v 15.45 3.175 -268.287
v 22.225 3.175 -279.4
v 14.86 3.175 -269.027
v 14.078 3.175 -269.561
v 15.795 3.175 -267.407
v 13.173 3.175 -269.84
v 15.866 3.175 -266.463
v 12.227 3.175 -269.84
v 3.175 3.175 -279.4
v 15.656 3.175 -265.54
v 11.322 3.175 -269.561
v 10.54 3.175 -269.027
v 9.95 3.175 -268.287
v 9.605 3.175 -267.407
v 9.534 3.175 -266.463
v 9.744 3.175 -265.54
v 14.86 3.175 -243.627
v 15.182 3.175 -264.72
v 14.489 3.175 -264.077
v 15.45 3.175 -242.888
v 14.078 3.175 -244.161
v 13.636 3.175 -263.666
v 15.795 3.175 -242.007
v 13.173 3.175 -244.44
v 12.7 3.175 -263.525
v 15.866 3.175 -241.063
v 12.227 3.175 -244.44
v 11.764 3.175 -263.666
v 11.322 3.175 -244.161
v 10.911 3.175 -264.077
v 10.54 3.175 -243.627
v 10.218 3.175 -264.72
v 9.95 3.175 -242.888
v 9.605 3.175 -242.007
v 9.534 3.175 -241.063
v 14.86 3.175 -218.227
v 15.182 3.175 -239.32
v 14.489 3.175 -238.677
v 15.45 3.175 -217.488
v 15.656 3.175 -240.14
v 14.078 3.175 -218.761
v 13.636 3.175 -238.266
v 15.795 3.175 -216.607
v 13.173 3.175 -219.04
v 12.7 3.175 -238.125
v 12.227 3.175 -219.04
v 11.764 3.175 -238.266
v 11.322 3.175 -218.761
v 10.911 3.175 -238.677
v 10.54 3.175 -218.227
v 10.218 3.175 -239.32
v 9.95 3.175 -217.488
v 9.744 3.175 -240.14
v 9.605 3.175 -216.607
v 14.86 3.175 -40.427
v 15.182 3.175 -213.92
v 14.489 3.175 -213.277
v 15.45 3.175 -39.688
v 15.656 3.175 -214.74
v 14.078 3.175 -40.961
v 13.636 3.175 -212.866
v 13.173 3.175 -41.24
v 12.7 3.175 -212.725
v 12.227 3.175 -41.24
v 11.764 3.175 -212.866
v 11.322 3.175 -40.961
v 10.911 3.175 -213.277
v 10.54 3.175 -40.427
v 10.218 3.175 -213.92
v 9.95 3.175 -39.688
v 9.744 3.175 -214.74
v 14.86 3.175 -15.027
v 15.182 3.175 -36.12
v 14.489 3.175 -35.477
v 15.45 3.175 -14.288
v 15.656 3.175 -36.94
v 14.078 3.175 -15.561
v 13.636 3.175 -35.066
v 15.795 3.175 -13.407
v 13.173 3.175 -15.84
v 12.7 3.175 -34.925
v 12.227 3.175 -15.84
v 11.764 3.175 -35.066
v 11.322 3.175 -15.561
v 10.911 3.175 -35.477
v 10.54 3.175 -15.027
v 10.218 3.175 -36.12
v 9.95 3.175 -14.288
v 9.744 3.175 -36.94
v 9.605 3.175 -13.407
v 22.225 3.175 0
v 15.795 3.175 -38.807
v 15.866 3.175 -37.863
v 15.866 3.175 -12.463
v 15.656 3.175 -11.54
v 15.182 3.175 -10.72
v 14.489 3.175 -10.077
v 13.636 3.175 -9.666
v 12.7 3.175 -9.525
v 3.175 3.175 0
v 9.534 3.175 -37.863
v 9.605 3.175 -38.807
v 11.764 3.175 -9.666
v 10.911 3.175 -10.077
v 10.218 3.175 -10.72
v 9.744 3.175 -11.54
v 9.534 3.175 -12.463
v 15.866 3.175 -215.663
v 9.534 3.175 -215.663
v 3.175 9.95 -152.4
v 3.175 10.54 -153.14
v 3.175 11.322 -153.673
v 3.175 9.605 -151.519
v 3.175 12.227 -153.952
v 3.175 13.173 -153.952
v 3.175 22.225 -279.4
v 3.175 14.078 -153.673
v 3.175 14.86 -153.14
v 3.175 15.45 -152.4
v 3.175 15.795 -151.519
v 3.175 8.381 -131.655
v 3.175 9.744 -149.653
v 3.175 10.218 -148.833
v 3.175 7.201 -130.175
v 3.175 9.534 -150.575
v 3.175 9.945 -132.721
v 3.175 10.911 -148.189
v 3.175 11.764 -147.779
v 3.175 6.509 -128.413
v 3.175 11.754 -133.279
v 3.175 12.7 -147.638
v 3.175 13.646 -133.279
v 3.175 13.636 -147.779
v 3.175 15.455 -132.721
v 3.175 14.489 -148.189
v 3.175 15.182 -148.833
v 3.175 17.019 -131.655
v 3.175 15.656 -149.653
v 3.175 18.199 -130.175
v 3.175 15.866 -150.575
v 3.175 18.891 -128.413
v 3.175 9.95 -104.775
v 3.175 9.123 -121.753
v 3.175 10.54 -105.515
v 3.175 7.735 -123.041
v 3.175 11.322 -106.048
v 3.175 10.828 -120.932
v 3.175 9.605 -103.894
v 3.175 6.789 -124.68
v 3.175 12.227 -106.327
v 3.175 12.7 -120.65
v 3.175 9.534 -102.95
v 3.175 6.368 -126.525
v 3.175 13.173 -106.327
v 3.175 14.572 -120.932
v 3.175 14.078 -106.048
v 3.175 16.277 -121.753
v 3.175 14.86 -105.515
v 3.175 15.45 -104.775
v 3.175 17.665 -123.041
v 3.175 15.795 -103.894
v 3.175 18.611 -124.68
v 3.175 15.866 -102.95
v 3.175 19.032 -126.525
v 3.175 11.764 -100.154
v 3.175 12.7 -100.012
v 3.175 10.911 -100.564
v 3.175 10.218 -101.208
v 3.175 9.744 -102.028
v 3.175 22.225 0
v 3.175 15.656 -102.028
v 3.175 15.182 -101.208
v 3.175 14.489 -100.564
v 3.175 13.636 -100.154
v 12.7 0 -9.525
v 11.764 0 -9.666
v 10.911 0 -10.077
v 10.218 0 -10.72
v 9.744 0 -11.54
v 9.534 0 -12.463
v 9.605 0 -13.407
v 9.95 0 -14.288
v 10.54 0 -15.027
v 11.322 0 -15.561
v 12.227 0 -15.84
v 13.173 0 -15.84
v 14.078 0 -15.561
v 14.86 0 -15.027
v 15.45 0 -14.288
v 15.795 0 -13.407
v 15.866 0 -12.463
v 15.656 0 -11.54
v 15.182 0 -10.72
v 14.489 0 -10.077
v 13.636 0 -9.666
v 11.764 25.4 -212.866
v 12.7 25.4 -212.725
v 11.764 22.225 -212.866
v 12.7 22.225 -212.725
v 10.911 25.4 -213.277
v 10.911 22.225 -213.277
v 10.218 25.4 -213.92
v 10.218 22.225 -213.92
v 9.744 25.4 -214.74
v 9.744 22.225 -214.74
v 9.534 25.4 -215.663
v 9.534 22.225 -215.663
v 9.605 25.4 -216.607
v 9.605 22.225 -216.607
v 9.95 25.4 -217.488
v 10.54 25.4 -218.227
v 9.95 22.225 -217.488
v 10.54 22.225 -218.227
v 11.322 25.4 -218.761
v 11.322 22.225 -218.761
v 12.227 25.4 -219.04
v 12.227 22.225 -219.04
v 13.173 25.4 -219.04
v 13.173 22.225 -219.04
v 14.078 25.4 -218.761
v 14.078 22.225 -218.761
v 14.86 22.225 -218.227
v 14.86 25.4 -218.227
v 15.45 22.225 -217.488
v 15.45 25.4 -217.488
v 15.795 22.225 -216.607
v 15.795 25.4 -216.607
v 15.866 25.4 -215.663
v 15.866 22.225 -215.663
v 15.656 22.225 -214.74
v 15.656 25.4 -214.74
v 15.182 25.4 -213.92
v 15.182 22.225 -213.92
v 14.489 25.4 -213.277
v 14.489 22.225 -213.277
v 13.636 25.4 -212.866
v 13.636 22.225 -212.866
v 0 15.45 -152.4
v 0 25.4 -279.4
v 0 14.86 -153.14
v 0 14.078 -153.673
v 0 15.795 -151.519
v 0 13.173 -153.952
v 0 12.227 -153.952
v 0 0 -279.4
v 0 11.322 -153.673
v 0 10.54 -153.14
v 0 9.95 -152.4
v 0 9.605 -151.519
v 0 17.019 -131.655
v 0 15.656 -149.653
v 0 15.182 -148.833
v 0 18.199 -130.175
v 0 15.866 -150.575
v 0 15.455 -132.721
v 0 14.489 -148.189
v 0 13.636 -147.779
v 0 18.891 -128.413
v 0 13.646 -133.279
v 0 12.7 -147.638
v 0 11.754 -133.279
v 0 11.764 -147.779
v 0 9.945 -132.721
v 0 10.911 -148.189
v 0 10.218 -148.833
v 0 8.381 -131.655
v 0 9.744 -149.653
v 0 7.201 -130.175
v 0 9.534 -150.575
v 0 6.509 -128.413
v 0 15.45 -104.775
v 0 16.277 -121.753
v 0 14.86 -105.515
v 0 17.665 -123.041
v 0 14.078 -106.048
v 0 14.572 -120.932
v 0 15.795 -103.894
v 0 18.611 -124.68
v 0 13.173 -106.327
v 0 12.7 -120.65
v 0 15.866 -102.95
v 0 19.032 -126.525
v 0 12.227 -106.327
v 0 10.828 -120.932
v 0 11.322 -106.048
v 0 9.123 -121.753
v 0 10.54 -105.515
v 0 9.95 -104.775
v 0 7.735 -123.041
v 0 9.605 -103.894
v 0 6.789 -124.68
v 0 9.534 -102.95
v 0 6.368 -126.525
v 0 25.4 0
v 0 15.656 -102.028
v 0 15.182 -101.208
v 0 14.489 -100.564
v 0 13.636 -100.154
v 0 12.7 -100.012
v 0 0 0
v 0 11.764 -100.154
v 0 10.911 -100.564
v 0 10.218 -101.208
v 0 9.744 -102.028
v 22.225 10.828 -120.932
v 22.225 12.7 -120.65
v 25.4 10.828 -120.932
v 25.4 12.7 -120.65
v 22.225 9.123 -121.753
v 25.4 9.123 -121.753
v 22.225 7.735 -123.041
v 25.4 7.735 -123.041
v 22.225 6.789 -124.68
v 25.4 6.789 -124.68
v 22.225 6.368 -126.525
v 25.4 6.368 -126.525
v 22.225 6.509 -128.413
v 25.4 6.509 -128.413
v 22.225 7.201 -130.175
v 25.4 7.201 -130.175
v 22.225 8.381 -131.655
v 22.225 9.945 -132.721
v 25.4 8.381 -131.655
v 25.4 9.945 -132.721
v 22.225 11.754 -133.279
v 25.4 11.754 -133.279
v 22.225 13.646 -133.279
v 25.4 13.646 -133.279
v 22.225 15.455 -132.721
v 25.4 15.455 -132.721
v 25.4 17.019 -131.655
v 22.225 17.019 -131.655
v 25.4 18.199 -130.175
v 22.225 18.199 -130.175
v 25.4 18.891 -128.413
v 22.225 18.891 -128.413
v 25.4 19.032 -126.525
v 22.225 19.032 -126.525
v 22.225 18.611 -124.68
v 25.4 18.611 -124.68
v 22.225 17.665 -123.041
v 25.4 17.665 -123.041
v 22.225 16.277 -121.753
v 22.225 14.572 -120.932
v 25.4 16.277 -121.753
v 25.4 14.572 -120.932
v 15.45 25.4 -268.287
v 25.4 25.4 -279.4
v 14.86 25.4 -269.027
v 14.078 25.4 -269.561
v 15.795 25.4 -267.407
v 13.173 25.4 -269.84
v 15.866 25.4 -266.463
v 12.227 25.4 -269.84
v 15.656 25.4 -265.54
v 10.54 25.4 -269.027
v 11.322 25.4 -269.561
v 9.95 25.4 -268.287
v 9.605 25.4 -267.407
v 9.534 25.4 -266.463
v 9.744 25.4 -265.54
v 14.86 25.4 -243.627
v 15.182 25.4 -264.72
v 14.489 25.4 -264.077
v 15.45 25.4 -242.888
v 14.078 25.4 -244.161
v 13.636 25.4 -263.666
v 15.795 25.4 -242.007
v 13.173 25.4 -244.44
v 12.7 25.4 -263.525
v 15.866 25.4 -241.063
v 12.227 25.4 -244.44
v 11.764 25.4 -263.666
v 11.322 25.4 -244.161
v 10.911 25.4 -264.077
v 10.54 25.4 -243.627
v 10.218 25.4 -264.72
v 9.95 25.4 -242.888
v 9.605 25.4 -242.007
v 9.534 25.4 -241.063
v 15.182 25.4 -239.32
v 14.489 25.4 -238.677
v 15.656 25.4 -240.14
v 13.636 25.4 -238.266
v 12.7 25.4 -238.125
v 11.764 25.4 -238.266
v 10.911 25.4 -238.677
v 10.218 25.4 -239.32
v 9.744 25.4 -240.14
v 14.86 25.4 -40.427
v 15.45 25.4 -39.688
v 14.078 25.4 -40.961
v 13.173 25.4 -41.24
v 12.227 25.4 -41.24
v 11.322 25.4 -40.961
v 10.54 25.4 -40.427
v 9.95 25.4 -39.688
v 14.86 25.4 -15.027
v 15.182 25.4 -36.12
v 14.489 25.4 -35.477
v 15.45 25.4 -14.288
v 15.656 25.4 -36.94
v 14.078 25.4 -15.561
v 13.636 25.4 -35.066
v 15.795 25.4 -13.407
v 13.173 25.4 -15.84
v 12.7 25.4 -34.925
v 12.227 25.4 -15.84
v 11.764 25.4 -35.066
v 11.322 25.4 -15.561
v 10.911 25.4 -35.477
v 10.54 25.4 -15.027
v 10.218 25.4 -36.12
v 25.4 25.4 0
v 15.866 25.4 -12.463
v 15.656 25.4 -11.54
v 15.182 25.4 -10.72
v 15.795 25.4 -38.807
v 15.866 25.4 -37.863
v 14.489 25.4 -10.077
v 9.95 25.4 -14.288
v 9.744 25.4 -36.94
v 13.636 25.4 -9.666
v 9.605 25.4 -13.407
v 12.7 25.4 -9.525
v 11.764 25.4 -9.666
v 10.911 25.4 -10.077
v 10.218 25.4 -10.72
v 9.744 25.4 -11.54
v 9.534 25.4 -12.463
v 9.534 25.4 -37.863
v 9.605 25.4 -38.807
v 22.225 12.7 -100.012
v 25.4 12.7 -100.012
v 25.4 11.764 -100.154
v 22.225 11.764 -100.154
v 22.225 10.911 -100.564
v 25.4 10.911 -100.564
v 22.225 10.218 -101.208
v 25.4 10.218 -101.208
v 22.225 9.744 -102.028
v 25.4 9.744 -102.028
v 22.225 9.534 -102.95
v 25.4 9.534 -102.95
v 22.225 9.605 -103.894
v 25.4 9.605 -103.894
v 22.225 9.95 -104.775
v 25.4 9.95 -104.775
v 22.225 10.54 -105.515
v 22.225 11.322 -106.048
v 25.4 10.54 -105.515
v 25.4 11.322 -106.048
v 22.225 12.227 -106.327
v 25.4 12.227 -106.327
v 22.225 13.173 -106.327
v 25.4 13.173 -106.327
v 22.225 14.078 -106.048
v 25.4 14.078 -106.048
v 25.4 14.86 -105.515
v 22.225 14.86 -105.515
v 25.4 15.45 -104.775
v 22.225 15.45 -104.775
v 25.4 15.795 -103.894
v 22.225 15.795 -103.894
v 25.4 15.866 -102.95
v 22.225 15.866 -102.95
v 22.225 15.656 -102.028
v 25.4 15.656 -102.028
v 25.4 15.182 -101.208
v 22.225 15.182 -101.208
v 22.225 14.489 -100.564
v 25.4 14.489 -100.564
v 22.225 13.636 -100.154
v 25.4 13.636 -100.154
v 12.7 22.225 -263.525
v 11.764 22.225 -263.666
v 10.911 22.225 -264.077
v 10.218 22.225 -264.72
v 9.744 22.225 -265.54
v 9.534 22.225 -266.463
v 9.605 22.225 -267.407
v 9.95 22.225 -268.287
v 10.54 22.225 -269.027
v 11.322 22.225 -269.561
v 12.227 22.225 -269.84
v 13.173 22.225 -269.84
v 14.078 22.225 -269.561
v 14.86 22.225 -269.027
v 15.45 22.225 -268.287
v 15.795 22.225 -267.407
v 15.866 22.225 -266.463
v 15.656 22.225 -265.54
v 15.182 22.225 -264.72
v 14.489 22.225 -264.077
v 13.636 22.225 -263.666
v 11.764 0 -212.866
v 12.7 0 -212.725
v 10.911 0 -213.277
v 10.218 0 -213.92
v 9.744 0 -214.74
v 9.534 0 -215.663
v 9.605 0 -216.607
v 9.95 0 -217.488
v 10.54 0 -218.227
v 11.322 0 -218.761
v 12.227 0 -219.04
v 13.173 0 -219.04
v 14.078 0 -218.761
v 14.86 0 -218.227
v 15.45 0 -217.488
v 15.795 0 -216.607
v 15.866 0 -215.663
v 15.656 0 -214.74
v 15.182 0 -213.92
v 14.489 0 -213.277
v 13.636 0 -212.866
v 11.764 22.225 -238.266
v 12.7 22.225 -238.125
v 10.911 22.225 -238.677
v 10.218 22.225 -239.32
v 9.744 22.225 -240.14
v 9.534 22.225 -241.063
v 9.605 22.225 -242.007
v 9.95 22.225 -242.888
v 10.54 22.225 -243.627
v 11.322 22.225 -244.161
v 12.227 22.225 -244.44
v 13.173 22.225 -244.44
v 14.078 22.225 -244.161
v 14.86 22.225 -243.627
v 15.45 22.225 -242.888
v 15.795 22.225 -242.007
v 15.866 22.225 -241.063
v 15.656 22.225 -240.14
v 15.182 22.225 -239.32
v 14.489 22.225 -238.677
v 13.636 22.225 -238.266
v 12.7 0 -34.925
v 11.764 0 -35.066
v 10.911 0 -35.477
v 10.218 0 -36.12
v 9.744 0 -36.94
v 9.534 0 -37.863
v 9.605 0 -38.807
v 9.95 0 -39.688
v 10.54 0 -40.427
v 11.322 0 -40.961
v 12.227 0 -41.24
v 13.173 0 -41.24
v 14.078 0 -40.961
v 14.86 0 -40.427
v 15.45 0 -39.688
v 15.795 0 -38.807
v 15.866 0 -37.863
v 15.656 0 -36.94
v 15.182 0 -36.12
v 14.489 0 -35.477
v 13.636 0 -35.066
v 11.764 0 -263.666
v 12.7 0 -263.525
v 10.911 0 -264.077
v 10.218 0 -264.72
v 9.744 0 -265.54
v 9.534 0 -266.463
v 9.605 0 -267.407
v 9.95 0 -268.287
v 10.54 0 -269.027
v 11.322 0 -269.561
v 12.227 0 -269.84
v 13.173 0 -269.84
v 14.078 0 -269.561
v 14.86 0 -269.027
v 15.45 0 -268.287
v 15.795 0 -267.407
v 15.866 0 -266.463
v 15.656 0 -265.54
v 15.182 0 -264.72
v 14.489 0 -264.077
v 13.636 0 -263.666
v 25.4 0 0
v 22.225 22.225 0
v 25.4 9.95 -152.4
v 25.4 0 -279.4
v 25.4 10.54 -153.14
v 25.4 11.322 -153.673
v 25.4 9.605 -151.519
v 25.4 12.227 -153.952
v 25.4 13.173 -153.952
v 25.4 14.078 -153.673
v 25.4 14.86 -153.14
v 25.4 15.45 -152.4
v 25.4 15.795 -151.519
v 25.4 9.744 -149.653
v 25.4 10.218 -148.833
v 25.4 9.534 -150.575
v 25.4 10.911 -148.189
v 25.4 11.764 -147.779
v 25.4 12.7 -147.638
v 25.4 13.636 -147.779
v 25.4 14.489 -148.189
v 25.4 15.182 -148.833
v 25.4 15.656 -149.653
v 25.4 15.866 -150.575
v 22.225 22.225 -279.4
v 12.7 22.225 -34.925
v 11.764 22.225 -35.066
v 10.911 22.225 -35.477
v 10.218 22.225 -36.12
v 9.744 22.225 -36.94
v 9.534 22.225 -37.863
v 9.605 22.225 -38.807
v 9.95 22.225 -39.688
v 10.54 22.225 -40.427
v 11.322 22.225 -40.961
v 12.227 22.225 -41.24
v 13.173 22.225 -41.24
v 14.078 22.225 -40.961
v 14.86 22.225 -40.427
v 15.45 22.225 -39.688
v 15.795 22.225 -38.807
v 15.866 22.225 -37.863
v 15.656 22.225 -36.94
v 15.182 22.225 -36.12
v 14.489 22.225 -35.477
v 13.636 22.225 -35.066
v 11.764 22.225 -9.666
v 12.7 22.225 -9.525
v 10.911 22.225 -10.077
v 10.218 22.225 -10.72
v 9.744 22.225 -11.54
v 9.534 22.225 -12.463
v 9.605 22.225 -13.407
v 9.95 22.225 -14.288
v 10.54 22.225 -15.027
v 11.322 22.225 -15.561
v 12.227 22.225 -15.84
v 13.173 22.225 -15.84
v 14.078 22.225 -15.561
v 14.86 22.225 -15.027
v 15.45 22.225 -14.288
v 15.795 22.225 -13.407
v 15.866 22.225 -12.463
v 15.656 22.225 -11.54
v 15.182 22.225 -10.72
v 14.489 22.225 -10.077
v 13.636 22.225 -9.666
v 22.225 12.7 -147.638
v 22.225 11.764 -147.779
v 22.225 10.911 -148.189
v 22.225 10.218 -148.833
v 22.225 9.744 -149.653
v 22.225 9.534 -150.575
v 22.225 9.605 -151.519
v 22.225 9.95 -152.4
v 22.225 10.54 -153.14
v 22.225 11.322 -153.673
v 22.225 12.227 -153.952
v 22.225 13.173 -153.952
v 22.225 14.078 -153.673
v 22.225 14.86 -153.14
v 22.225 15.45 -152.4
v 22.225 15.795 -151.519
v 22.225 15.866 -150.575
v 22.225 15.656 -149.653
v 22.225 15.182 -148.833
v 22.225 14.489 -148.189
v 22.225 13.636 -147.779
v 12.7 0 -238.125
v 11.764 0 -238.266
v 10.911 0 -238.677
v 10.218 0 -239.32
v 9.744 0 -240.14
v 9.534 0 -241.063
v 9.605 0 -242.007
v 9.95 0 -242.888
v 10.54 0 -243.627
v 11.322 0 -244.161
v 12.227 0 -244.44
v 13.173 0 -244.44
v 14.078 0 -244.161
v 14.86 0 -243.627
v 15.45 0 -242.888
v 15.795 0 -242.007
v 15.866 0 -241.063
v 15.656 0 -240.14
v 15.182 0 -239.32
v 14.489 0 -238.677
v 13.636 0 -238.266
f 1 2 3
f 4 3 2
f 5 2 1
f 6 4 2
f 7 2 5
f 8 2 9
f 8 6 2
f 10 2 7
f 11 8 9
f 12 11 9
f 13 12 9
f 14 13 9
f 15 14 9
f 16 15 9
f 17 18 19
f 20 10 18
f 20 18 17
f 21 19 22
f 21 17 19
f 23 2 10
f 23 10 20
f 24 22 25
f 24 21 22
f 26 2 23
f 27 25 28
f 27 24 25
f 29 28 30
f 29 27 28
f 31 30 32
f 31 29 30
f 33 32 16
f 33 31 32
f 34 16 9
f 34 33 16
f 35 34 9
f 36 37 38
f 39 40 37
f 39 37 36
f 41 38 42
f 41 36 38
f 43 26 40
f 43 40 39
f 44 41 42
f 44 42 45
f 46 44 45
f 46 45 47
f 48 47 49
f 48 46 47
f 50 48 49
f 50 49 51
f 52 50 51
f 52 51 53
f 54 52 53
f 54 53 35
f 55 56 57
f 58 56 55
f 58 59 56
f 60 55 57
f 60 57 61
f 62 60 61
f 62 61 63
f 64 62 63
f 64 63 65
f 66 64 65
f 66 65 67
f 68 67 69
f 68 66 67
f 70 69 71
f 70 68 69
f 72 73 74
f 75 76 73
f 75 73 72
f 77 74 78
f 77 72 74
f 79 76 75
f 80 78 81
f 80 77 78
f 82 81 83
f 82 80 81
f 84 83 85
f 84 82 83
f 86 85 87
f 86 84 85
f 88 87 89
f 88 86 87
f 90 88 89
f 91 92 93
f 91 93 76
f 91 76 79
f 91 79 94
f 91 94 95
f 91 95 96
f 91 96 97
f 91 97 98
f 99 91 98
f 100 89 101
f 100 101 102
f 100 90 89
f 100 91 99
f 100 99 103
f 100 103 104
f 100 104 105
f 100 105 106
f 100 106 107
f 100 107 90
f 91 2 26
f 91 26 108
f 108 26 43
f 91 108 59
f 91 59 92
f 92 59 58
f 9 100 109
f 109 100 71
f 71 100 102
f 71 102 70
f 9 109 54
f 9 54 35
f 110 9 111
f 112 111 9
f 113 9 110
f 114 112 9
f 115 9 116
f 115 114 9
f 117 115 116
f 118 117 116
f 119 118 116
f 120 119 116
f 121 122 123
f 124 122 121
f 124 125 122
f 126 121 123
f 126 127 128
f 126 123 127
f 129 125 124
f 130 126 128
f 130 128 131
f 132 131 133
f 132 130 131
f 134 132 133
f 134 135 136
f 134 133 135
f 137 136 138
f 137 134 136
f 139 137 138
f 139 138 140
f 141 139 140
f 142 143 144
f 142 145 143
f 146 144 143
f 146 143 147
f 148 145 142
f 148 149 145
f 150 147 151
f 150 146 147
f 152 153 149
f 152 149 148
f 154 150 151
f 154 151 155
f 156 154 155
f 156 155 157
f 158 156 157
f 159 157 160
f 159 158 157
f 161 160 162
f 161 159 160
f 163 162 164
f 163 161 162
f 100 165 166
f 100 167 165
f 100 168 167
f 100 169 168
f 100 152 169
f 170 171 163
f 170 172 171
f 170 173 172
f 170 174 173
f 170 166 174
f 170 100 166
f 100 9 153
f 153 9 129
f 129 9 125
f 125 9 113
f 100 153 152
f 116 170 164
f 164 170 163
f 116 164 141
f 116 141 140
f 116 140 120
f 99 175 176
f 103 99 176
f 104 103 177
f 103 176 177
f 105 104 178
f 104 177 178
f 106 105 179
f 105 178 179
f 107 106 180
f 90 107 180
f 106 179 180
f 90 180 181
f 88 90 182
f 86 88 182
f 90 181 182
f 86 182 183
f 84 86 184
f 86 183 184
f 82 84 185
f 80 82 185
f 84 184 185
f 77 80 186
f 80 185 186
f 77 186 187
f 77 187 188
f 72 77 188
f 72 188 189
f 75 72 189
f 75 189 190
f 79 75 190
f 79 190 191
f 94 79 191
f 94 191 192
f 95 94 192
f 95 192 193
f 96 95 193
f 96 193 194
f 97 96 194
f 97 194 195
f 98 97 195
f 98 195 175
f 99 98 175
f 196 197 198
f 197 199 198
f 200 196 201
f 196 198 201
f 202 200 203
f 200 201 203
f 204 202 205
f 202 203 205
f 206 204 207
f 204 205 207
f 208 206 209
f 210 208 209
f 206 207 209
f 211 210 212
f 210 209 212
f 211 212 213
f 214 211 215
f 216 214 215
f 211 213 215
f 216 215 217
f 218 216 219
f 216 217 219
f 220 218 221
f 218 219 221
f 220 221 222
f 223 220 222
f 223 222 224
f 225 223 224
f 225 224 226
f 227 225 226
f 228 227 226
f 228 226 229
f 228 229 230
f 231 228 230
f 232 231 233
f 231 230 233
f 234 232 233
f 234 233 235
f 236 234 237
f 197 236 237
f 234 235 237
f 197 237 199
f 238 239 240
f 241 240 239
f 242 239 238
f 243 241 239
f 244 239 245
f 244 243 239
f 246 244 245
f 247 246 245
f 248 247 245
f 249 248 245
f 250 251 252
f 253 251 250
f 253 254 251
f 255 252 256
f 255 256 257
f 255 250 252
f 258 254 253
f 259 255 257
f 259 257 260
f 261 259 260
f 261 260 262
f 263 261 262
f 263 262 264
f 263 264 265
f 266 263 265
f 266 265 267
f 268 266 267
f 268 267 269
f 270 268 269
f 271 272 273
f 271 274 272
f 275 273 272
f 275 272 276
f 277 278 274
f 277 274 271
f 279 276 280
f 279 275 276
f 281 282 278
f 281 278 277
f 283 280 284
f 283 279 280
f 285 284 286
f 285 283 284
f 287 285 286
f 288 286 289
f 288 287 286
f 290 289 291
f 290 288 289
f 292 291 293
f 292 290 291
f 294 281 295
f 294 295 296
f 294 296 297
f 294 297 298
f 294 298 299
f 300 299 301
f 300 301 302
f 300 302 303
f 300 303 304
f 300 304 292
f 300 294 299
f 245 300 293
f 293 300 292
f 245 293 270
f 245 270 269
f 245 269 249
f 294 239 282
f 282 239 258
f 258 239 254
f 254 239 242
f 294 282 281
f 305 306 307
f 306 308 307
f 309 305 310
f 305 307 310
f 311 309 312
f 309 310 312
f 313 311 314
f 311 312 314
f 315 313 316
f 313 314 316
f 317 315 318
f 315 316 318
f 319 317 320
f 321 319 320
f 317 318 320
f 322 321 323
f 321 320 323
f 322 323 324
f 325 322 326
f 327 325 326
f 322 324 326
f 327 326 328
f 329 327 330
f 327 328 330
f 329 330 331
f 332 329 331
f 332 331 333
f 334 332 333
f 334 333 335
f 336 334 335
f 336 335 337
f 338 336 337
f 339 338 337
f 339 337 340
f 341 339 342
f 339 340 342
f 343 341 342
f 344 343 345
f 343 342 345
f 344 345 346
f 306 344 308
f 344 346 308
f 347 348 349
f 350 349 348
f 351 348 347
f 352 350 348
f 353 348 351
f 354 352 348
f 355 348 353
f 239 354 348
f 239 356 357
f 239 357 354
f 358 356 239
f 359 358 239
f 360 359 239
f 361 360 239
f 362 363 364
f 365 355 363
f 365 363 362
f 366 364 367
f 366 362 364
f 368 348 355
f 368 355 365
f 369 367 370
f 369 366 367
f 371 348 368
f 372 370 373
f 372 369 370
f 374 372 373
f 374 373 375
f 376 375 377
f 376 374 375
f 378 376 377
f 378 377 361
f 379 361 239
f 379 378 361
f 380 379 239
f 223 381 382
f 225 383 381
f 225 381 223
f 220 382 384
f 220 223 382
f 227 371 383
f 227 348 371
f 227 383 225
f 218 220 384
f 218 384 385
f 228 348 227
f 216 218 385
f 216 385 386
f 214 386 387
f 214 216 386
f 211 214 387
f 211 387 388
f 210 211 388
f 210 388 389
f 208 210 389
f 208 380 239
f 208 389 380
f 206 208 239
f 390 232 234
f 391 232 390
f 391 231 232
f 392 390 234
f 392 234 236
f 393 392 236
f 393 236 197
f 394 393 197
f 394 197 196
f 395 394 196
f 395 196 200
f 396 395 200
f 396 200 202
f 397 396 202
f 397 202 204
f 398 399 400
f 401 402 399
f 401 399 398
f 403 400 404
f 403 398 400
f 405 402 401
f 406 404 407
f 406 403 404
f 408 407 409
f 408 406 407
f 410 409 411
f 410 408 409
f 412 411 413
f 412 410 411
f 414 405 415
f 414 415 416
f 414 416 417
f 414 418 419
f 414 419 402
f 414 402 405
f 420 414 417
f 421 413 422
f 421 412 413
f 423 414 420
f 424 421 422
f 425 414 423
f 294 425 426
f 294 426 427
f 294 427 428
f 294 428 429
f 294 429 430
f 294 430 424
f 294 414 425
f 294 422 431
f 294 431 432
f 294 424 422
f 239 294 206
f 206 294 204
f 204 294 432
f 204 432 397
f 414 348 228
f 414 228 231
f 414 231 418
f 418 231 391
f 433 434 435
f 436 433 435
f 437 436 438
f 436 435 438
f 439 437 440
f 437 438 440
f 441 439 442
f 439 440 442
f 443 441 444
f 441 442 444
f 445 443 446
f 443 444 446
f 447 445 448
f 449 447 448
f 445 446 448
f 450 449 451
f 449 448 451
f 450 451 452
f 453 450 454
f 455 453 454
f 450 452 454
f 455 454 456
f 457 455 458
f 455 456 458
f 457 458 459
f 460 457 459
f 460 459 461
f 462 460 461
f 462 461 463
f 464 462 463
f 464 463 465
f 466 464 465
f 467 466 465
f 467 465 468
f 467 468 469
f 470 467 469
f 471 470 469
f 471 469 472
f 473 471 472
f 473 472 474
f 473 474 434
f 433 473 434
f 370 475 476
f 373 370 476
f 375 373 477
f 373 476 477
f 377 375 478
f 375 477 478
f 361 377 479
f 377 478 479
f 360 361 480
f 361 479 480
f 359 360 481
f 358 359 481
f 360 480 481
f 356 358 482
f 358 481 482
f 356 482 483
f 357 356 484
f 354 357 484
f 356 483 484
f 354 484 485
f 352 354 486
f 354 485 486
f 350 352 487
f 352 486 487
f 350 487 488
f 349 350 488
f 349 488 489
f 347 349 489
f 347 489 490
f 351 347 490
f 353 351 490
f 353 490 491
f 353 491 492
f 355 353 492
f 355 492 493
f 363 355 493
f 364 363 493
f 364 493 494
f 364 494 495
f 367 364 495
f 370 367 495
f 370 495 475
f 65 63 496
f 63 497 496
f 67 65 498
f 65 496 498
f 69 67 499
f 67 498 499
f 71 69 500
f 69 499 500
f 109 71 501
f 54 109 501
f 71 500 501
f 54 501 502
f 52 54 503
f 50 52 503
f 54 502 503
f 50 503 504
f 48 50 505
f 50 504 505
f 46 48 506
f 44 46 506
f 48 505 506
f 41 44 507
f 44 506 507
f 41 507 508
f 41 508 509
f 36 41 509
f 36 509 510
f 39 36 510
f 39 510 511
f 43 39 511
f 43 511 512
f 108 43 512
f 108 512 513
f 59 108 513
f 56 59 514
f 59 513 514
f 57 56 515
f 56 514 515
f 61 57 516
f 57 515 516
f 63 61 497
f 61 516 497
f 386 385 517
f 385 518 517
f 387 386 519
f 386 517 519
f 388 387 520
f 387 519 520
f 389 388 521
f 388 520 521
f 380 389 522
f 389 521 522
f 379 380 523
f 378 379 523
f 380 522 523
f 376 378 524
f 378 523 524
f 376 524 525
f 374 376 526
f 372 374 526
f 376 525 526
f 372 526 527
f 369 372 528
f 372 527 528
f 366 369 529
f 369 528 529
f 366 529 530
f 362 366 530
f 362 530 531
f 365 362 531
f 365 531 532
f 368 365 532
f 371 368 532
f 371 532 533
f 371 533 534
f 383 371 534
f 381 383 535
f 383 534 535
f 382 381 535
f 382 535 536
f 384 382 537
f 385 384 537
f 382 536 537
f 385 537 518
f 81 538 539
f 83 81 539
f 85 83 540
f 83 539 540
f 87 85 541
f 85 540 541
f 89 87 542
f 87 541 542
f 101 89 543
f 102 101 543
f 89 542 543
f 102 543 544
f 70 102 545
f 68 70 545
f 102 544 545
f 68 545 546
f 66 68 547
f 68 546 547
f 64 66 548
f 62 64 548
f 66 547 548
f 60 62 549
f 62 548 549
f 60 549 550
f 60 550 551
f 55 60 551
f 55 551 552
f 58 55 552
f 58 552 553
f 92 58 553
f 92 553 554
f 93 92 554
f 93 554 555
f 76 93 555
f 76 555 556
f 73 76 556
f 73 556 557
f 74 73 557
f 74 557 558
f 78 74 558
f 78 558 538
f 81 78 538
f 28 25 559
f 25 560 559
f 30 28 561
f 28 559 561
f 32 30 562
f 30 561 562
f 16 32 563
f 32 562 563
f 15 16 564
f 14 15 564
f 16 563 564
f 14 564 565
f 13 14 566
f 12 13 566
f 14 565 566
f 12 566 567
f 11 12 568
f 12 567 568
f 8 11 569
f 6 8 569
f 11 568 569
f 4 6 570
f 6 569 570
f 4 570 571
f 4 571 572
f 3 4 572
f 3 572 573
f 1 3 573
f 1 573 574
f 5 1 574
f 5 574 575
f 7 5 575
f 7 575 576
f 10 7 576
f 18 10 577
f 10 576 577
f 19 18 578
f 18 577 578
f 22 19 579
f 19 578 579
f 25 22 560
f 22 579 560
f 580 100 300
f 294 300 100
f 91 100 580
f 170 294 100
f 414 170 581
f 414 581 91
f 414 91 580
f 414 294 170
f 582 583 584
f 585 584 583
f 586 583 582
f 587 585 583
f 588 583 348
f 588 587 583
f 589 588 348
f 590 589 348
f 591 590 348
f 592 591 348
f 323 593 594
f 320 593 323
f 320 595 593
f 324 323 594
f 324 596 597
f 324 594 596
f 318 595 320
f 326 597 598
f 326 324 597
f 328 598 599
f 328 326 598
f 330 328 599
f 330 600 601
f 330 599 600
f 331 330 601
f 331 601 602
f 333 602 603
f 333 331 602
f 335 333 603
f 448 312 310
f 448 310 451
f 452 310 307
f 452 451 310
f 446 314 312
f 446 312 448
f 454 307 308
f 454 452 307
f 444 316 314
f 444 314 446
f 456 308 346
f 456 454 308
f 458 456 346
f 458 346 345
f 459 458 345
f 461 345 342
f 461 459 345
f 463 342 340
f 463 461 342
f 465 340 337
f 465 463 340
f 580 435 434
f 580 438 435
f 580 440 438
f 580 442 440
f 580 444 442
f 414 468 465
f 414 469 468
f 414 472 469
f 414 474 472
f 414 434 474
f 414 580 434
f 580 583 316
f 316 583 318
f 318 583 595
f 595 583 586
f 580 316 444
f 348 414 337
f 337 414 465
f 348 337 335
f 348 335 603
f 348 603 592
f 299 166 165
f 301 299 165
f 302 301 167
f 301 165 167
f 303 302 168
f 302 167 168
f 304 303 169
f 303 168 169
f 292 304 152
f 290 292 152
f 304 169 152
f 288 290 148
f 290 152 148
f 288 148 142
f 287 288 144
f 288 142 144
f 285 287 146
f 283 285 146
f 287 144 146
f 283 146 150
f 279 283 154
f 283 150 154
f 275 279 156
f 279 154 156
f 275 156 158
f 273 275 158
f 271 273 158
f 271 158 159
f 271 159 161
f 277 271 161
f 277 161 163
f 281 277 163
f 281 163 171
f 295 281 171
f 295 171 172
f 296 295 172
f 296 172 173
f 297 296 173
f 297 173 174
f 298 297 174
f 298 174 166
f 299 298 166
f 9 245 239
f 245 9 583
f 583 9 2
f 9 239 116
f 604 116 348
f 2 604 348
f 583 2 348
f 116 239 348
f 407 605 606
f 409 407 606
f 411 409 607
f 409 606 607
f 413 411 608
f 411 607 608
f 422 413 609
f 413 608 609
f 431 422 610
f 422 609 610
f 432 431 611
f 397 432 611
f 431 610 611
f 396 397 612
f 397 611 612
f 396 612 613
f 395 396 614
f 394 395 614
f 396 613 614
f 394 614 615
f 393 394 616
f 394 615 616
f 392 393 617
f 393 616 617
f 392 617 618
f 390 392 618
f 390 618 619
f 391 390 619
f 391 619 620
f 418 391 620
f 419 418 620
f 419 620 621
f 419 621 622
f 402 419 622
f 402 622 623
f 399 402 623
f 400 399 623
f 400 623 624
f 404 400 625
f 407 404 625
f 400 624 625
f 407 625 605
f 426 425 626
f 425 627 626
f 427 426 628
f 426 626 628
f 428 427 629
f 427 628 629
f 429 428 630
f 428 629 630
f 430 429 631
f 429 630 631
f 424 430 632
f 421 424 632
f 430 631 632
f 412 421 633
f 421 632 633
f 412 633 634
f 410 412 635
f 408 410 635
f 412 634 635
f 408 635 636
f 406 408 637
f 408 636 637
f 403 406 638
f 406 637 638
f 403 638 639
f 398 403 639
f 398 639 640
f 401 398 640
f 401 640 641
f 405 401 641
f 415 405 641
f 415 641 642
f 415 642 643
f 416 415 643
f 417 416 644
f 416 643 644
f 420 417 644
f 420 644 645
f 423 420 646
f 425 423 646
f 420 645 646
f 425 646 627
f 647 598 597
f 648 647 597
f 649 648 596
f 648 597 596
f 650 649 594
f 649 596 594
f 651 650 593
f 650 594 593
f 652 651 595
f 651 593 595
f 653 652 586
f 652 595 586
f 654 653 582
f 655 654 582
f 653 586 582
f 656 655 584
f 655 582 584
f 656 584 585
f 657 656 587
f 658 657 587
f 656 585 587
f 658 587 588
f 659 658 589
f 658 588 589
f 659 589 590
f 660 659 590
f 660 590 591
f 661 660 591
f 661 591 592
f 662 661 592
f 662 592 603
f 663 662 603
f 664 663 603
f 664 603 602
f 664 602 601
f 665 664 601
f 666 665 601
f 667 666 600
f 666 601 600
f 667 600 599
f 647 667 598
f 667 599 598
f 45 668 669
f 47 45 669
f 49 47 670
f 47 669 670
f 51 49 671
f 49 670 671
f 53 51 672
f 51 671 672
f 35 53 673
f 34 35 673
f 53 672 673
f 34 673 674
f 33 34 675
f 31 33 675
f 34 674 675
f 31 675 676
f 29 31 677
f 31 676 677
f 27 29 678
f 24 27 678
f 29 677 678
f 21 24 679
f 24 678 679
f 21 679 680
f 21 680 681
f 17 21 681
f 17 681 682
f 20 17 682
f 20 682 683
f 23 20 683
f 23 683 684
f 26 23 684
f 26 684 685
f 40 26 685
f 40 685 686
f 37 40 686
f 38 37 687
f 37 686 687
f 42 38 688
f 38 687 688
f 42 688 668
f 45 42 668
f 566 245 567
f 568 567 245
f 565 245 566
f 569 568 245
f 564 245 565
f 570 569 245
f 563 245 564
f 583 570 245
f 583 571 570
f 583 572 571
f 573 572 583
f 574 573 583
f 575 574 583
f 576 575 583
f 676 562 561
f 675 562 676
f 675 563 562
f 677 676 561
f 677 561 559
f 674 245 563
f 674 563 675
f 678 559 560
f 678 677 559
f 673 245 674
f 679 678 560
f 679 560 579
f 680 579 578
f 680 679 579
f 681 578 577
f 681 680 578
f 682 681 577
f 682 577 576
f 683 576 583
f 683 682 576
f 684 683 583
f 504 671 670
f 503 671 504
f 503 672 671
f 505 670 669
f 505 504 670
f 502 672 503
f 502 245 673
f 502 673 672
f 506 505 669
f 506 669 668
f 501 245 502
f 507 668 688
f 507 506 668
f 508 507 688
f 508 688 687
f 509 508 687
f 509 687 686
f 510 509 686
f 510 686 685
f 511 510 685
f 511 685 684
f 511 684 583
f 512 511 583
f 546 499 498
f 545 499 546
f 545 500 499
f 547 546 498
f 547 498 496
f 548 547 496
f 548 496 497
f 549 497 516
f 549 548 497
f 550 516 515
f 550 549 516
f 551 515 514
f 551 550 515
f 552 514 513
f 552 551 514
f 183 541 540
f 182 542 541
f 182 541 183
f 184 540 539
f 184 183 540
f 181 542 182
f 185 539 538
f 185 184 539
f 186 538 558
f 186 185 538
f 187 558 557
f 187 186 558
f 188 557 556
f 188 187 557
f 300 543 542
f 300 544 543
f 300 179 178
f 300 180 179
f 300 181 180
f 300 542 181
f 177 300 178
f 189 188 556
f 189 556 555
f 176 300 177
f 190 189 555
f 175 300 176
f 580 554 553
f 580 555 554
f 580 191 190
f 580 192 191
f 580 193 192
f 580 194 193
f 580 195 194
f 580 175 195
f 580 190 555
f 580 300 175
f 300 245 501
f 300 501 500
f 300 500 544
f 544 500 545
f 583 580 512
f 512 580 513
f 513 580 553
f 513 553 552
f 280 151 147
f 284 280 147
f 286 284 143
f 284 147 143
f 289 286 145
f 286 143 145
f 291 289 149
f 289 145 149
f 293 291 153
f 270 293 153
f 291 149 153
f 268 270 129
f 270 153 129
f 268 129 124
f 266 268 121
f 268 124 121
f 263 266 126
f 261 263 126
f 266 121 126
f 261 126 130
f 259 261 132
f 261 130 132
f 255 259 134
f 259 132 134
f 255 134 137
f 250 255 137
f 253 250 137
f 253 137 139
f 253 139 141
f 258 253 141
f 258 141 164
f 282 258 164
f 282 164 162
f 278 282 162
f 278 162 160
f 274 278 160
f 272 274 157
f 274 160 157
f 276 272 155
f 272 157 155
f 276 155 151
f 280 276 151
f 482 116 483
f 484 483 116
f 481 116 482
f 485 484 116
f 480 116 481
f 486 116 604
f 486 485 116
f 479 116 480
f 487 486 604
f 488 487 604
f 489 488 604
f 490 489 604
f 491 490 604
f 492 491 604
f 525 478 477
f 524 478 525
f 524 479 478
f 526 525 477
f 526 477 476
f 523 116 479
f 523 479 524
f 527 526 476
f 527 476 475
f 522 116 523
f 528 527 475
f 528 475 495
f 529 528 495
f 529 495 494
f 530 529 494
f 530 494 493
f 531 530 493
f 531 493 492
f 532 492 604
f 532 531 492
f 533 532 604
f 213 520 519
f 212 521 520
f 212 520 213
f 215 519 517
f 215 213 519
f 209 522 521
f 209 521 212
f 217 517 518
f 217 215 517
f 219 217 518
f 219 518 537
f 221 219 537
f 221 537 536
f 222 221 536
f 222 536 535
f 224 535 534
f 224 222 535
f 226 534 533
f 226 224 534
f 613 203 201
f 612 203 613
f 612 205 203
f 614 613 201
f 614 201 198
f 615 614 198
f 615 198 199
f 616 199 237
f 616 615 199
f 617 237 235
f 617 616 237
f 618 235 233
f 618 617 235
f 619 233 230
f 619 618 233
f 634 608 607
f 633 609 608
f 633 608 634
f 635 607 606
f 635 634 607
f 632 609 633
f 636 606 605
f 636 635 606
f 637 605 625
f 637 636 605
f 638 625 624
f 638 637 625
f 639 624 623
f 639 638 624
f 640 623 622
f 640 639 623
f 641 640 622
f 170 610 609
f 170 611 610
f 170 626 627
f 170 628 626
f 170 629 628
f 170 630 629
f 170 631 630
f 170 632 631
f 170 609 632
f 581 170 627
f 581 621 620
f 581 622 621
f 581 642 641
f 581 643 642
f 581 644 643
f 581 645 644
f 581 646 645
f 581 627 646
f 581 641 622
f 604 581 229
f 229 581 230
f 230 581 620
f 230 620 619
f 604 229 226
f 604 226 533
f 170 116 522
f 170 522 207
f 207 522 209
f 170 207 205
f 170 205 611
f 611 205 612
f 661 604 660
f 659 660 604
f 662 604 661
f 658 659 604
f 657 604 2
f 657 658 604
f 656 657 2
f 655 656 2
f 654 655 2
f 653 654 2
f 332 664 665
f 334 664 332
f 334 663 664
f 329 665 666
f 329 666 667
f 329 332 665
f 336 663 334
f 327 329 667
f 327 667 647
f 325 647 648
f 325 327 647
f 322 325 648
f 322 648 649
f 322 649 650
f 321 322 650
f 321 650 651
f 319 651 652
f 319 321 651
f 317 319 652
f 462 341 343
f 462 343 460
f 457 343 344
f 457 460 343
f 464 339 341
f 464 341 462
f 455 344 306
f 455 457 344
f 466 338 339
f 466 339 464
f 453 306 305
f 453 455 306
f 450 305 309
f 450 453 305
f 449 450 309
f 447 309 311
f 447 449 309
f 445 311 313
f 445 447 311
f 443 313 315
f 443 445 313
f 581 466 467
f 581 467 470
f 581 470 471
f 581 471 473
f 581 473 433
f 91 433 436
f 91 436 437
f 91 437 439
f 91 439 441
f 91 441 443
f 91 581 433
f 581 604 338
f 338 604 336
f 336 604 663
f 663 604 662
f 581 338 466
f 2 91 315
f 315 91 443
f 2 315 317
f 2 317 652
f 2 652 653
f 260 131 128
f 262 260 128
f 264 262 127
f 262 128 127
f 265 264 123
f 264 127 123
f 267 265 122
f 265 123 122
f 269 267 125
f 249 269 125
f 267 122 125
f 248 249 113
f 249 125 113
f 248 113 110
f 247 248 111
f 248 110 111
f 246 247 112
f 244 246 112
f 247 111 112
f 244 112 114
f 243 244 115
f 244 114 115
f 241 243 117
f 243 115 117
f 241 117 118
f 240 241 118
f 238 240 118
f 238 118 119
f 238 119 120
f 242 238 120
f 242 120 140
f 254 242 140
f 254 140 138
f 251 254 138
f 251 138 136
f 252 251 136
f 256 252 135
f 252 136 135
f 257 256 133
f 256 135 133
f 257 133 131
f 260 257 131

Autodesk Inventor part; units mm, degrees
ref_plane "YZ Plane" through (0, 0, 0) normal (1, 0, 0) x (0, 1, 0)
ref_plane "XZ Plane" through (0, 0, 0) normal (0, 1, 0) x (-1, 0, 0)
ref_plane "XY Plane" through (0, 0, 0) normal (0, 0, 1) x (1, 0, 0)
sketch "Sketch1" plane through (0, 0, 0) normal (0, 0, 1) x (1, 0, 0)
  line L0 (0, 0) -> (25.4, 0)
  line L1 (25.4, 0) -> (25.4, 25.4)
  line L2 (25.4, 25.4) -> (0, 25.4)
  line L3 (0, 25.4) -> (0, 0)
  line L4 (3.175, 22.225) -> (22.225, 22.225)
  line L5 (22.225, 22.225) -> (22.225, 3.175)
  line L6 (22.225, 3.175) -> (3.175, 3.175)
  line L7 (3.175, 3.175) -> (3.175, 22.225)
  dimension "d0" = 25.4
  dimension "d1" = 25.4
  dimension "d2" = 3.175
extrude "Extrusion1" add sketch "Sketch1" against normal blind 279.4
sketch "Sketch2" plane through (0, 25.4, 0) normal (0, 1, 0) x (1, 0, 0)
  line L0 (25.4, 279.4) -> (0, 279.4) projected
  line L1 (25.4, 0) -> (0, 0) projected
  point P0 (12.7, 266.7)
  point P1 (12.7, 241.3)
  point P2 (12.7, 215.9)
  point P3 (12.7, 12.7)
  point P4 (12.7, 38.1)
  dimension "d5" = 25.4
  dimension "d6" = 12.7
  dimension "d7" = 25.4
  dimension "d8" = 25.4
  dimension "d9" = 12.7
hole "Hole1" at (12.7, 25.4, -266.7) at (12.7, 25.4, -241.3) at (12.7, 25.4, -215.9) at (12.7, 25.4, -12.7) at (12.7, 25.4, -38.1) direction (0, -1, 0) diameter 6.35 depth 25.4 tip angle 118
sketch "Sketch3" plane through (0, 0, 0) normal (-1, 0, 0) x (0, 0, 1)
  line L0 (-279.4, 25.4) -> (-279.4, 0) projected
  line L1 (0, 25.4) -> (0, 0) projected
  point P0 (-127, 12.7)
  point P1 (-103.1875, 12.7)
  point P2 (-150.8125, 12.7)
  point P3 (0, 12.7)
  dimension "d17" = 152.4
  dimension "d18" = 23.8125
  dimension "d19" = 23.8125
hole "Hole2" at (0, 12.7, -103.1875) at (0, 12.7, -150.8125) direction (1, 0, 0) diameter 6.35 depth 25.4 tip angle 118
hole "Hole3" at (0, 12.7, -127) direction (1, 0, 0) diameter 12.7 depth 25.4 tip angle 118
properties part number "shooter 9 inch horizontal"
